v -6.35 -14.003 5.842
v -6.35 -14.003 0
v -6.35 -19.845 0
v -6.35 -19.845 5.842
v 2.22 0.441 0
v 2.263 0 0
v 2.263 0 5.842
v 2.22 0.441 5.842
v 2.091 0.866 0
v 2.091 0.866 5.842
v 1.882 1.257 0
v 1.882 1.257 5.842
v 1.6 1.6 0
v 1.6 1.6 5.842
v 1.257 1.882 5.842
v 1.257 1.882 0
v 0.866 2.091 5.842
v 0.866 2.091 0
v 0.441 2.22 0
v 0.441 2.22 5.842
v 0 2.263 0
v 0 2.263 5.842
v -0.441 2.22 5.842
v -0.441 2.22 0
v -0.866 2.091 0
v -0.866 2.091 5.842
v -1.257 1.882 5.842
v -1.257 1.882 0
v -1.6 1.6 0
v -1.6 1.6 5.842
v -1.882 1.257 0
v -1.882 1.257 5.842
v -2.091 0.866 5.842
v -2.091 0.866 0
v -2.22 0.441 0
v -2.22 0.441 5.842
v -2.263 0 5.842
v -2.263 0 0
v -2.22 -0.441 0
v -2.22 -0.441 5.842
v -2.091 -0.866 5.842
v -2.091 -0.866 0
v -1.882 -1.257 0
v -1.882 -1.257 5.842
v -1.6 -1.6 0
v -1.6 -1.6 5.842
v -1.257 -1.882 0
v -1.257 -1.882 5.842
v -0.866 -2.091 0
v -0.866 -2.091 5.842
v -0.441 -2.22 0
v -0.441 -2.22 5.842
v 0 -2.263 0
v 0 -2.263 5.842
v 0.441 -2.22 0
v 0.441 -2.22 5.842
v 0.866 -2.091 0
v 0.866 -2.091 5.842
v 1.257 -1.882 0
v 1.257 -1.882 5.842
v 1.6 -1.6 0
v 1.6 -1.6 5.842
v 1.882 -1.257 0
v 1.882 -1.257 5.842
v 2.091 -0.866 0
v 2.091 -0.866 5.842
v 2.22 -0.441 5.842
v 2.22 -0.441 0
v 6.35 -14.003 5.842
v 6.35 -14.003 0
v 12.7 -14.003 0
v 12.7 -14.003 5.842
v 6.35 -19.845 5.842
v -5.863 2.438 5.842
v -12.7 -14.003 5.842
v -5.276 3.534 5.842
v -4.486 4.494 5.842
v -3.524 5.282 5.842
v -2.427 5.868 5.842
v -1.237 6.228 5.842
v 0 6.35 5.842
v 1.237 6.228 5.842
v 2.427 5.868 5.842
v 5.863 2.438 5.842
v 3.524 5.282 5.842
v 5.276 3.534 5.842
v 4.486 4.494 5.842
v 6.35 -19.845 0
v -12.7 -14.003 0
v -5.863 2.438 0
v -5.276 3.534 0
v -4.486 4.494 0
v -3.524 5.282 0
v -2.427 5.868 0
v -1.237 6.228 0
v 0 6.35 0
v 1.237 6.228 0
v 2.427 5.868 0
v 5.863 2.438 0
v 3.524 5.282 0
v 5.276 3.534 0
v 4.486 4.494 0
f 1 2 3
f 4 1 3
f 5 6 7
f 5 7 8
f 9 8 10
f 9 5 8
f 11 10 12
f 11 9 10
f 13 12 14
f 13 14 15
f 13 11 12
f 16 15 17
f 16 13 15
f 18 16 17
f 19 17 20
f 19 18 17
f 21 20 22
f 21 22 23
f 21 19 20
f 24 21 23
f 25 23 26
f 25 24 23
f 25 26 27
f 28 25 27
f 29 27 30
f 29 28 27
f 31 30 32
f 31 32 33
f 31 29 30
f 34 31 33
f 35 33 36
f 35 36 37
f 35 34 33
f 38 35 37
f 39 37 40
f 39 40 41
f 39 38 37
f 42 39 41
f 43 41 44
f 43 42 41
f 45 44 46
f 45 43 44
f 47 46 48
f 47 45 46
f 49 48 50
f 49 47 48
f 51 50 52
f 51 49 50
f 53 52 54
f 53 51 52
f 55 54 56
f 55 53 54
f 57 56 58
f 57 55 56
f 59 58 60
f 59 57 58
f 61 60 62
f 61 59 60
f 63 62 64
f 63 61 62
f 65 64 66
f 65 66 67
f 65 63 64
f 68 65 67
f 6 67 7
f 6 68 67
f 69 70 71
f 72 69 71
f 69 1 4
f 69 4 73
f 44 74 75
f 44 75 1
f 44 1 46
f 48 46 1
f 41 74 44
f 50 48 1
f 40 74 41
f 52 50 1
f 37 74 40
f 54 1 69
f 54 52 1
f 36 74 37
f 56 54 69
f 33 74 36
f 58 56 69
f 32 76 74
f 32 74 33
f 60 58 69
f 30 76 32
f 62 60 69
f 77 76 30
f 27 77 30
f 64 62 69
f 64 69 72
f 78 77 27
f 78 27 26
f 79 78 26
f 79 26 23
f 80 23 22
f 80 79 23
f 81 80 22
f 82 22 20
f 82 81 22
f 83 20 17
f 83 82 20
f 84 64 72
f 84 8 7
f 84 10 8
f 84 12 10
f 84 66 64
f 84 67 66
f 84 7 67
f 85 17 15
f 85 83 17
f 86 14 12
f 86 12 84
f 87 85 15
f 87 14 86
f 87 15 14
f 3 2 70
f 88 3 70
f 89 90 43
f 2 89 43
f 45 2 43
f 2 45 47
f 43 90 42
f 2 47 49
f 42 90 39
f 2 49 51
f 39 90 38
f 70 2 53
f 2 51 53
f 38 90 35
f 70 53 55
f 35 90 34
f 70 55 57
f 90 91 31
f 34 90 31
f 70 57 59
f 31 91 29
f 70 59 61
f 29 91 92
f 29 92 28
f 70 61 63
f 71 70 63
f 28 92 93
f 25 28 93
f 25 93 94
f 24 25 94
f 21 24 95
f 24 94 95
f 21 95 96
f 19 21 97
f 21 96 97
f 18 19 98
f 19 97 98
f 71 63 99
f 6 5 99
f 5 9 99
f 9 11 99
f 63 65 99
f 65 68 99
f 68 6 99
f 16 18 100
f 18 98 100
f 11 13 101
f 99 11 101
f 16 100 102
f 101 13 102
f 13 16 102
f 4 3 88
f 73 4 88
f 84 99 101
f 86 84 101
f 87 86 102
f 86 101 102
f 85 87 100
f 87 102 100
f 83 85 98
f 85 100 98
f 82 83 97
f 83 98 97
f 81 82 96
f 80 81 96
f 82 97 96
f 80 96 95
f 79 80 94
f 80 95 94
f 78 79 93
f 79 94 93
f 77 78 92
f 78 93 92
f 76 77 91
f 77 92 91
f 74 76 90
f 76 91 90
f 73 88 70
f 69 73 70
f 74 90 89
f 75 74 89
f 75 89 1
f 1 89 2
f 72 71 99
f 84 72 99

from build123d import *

# Parameters (mm, degrees)
F0_R     = 2.263
F1_DEPTH = 5.842


with BuildPart() as f1:
    # F0 (on Top) → F1 (new body)
    with BuildSketch(Plane.XY):
        with BuildLine():
            Line((-6.35, -14.00302), (-6.35, -19.84502))
            Line((-6.35, -19.84502), (6.35, -19.84502))
            Line((6.35, -19.84502), (6.35, -14.00302))
            Line((6.35, -14.00302), (12.7, -14.00302))
            Line((12.7, -14.00302), (5.863279, 2.438127))
            ThreePointArc((5.863279, 2.438127), (0, 6.35), (-5.863279, 2.438127))
            Line((-5.863279, 2.438127), (-12.7, -14.00302))
            Line((-12.7, -14.00302), (-6.35, -14.00302))
        make_face()
        Circle(F0_R, mode=Mode.SUBTRACT)
    extrude(amount=F1_DEPTH)


solid = f1.part
